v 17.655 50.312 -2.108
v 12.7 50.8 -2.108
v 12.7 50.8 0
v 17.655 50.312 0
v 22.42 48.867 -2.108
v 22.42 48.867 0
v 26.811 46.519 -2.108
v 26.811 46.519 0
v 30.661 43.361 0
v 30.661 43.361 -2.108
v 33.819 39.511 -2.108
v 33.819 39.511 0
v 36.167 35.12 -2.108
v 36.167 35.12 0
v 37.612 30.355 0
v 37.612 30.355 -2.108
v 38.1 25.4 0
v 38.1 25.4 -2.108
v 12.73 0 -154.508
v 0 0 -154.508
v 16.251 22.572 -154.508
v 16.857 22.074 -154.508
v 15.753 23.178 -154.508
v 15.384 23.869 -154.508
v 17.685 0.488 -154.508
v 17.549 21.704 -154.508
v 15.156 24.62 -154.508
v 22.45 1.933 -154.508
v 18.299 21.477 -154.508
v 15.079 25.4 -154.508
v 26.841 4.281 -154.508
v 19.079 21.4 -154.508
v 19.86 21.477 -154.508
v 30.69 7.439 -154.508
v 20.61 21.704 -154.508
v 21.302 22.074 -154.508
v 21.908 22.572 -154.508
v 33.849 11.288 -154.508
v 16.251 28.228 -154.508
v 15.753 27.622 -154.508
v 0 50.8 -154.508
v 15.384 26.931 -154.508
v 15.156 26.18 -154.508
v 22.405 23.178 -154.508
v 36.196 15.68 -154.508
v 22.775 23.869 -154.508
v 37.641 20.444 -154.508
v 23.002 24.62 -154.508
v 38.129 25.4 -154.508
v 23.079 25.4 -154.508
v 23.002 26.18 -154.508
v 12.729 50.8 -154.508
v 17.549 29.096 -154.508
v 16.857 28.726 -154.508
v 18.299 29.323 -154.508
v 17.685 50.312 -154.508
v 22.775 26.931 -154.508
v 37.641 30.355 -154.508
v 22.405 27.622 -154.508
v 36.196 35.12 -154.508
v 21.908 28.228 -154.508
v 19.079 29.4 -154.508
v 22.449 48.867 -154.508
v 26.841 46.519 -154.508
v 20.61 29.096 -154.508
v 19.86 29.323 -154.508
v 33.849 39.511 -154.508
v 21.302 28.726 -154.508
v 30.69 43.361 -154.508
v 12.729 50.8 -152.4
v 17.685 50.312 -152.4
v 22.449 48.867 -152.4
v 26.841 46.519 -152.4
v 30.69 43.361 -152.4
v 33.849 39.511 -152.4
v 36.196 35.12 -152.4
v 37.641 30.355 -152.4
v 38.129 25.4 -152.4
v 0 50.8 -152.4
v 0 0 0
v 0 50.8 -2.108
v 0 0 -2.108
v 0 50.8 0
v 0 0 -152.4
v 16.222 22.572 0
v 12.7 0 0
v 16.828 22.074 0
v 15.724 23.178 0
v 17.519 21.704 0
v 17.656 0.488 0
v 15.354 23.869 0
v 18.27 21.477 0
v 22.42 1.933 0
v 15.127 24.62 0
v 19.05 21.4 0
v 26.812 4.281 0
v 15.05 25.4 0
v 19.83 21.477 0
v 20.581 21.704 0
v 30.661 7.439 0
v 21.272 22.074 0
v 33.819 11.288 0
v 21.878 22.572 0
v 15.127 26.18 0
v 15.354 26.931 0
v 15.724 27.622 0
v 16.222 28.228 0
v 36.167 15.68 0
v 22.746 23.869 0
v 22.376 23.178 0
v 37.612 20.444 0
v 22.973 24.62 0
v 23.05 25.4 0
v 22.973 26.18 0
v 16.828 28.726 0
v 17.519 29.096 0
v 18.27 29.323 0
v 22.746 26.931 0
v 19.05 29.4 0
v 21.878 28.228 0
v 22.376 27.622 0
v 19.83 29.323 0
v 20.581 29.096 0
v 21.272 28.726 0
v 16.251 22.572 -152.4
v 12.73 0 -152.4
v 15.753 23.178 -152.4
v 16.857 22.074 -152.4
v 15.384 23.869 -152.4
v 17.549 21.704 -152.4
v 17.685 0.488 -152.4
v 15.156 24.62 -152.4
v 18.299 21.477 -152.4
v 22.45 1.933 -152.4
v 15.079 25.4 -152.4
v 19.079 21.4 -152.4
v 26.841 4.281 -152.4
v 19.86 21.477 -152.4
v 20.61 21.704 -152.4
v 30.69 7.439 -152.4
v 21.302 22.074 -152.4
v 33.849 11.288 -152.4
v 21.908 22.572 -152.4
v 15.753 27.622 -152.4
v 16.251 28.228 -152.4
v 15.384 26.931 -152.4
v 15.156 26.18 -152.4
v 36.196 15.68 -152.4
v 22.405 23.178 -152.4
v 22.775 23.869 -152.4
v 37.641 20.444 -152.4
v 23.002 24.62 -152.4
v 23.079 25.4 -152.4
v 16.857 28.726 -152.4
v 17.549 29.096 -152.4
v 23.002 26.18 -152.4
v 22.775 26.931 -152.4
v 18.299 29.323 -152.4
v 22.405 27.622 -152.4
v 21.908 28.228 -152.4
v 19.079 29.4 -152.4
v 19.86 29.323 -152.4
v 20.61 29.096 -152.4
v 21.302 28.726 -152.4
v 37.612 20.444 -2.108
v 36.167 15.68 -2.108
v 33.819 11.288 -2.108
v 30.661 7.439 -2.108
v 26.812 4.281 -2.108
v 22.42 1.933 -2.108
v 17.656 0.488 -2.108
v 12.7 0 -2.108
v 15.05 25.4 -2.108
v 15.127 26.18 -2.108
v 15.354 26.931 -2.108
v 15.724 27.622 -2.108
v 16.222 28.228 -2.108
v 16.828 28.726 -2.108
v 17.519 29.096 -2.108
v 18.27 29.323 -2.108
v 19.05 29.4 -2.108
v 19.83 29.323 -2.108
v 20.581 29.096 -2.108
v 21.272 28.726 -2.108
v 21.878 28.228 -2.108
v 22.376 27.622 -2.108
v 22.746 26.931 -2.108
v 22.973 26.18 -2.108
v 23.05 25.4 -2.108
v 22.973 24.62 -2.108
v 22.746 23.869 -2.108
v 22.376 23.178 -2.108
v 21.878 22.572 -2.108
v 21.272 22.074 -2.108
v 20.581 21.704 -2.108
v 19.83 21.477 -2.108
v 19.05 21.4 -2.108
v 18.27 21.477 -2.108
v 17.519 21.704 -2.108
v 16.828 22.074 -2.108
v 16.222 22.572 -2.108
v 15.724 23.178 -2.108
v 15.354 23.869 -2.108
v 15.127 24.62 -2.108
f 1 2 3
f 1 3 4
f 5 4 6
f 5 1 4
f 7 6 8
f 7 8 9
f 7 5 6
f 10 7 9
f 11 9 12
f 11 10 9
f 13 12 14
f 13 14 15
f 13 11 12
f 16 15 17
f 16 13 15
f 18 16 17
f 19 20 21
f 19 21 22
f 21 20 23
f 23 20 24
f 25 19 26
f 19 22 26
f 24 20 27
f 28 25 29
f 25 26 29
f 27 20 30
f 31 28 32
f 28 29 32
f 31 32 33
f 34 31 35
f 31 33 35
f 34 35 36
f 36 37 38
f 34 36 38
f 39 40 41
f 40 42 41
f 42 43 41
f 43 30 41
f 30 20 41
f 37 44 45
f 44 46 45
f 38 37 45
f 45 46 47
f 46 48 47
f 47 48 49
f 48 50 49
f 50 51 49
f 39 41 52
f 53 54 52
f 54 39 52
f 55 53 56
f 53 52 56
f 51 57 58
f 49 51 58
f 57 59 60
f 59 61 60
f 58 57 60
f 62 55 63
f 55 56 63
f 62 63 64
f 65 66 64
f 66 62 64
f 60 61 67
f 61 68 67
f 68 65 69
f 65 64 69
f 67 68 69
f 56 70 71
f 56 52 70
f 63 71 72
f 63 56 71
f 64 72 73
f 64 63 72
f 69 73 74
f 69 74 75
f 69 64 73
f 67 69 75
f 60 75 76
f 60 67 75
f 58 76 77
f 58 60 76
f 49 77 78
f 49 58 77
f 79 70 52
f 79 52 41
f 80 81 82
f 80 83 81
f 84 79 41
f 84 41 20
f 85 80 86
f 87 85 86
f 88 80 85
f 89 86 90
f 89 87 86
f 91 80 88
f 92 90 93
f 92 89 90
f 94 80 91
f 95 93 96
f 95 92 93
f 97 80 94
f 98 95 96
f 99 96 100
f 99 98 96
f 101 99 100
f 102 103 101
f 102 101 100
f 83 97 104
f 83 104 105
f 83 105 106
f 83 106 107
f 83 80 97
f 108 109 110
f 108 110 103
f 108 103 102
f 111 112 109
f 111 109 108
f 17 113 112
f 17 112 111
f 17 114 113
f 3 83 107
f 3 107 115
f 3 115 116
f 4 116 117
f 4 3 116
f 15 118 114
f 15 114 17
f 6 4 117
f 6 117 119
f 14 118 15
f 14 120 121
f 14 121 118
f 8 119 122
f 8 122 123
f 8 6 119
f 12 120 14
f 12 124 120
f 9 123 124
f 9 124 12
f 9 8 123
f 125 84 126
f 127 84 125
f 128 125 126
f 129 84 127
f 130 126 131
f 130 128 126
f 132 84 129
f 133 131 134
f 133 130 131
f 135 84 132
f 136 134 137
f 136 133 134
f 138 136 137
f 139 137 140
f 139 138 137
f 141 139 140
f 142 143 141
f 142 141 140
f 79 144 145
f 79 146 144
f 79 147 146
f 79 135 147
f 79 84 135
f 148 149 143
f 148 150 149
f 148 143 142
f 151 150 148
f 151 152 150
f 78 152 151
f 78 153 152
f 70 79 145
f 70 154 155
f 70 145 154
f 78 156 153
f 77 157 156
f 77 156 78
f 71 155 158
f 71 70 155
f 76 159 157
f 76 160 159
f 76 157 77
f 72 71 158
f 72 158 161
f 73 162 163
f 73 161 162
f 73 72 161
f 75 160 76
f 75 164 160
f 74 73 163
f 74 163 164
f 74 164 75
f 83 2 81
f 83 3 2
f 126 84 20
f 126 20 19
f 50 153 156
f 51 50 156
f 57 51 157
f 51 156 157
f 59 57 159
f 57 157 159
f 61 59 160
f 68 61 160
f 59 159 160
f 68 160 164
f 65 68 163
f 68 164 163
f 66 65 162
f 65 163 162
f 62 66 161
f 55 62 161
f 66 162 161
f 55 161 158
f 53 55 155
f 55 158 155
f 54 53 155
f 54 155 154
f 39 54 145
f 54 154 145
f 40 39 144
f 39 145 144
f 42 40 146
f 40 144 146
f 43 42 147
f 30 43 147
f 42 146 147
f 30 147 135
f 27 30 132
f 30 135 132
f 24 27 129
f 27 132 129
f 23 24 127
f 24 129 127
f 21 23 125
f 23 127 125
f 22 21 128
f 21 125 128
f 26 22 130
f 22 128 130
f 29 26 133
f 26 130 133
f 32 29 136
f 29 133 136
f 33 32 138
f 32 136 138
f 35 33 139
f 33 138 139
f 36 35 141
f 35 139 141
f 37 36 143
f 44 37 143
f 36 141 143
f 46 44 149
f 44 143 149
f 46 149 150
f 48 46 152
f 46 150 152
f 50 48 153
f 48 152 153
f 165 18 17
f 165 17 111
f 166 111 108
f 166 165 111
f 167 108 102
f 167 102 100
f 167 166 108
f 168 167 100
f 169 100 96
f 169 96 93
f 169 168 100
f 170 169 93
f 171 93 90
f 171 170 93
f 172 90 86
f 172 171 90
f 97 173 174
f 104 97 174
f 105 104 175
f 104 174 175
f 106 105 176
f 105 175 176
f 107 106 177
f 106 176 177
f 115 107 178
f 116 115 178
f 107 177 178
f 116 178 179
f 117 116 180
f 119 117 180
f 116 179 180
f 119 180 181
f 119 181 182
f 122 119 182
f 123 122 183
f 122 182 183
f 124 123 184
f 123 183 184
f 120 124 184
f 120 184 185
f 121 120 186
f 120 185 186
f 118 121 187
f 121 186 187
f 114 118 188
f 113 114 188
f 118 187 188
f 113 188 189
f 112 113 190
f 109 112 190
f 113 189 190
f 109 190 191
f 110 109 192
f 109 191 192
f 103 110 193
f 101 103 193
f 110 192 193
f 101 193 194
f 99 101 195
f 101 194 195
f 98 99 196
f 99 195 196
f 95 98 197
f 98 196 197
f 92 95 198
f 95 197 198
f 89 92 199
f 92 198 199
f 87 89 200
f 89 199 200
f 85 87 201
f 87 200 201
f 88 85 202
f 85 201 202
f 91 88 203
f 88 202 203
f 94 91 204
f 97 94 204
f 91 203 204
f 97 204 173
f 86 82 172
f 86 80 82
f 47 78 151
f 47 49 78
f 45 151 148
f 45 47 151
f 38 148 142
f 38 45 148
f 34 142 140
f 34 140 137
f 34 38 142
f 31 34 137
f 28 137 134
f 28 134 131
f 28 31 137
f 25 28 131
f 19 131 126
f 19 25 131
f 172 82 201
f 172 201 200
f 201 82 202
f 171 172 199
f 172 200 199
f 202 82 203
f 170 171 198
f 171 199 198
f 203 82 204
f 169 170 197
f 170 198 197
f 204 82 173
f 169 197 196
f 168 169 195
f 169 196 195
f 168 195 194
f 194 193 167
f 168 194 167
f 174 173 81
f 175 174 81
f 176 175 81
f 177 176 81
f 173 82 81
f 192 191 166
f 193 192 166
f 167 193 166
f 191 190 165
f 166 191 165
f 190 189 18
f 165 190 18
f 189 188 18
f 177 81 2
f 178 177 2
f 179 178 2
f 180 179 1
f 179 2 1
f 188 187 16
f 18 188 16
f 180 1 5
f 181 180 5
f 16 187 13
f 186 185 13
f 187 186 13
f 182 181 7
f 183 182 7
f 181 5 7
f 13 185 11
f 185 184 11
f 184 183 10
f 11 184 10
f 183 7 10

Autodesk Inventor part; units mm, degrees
ref_plane "YZ Plane" through (0, 0, 0) normal (1, 0, 0) x (0, 1, 0)
ref_plane "XZ Plane" through (0, 0, 0) normal (0, 1, 0) x (-1, 0, 0)
sketch "Side Element" plane through (0, 0, 0) normal (0, 0, 1) x (1, 0, 0)
  line L0 (0, 0) -> (38.1, 0)
  line L1 (38.1, 0) -> (38.1, 50.8)
  line L2 (38.1, 50.8) -> (0, 50.8)
  line L3 (0, 50.8) -> (0, 0)
  dimension "d0" = 38.1
  dimension "d1" = 50.8
extrude "Extrusion1" add sketch "Side Element" against normal blind 2.1082
fillet "Fillet1" radius 25.4 1 edges at (38.1, 50.8, -1.0541)
ref_plane "Work Plane2" through (0, 0, -152.4) normal (0, 0, 1) x (1, 0, 0)
sketch "Sketch6" plane through (0, 0, -152.4) normal (0, 0, 1) x (1, 0, 0)
  line L0 (0, 0) -> (38.1293, 0)
  line L1 (38.1293, 0) -> (38.1293, 50.8)
  line L2 (38.1293, 50.8) -> (0, 50.8)
  line L3 (0, 50.8) -> (0, 0)
  dimension "d23" = 50.8
extrude "Extrusion5" add sketch "Sketch6" against normal blind 2.1082
fillet "Fillet3" radius 25.4 1 edges at (38.1293, 50.8, -153.4541)
sketch "Sketch7" plane through (0, 0, -152.4) normal (0, 0, 1) x (1, 0, 0)
  circle A0 centre (19.0793, 25.4) radius 4
  line L0 (0, 0) -> (38.1293, 0) projected
  line L1 (38.1293, 0) -> (38.1293, 25.4) projected
  dimension "d27" = 8
  dimension "d28" = 25.4
  dimension "d29" = 19.05
extrude "Extrusion6" cut sketch "Sketch7" against normal blind 2.1082
sketch "Sketch8" plane through (0, 0, -2.1082) normal (0, 0, -1) x (-1, 0, 0)
  circle A0 centre (-19.05, 25.4) radius 4
  line L0 (-38.1, 0) -> (0, 0) projected
  line L1 (0, 0) -> (0, 50.8) projected
  dimension "d32" = 8
  dimension "d33" = 25.4
  dimension "d34" = 19.05
extrude "Extrusion7" cut sketch "Sketch8" against normal blind 2.1082
fillet "Fillet4" radius 25.4 1 edges at (38.1, 0, -1.0541)
fillet "Fillet5" radius 25.4 1 edges at (38.1293, 0, -153.4541)
properties part number "Side Beam"
